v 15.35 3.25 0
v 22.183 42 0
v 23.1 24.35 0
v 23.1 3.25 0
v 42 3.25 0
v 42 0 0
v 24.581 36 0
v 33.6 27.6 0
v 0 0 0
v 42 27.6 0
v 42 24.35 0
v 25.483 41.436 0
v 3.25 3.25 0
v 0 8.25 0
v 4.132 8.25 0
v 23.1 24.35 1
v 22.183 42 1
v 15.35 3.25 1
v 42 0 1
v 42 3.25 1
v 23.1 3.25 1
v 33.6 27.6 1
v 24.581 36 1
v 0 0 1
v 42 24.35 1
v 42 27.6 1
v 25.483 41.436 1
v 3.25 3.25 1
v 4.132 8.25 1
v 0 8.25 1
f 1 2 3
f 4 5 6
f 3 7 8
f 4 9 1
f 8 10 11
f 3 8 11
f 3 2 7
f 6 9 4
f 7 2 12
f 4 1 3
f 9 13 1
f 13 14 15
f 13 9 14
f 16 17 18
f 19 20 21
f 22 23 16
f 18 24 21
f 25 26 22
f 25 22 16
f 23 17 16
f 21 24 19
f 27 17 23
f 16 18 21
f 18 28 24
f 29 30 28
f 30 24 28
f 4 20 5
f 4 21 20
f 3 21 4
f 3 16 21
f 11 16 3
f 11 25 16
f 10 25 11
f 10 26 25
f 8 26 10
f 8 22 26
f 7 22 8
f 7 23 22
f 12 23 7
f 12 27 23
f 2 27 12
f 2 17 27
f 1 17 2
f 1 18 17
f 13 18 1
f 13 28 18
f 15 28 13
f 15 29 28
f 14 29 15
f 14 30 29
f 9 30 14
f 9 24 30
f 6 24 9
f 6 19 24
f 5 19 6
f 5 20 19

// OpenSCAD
// created by IndiePandaaaaa | Lukas

THICKNESS = 3.25;
TOLERANCE = 0.1;
CHAMFER = 1.5;
SCREW_OD = 3.5;
$fn = 75;

DESK_THICKNESS = 21;
PHONE_THICKNESS = 12;
PHONE_ANGLE = 10;

module phone_mount(desk_thickness, phone_thickness, phone_angle = 10, thickness = 3, chamfer = 1, tolerance = 0.1) {
    linear_extrude(1) {
        depth = desk_thickness * 2;
        height = desk_thickness * 2;
        slope_angle = 30;
        polygon([
                [0, 0],
                [depth, 0],
                [depth, thickness],
                [depth * 0.55, thickness],
                [depth * 0.55, thickness + desk_thickness + tolerance],
                [depth, thickness + desk_thickness + tolerance],
                [depth, thickness * 2 + desk_thickness + tolerance],
                [depth * 0.8, thickness * 2 + desk_thickness + tolerance],
                [depth * 0.55 + (depth * 0.2) / tan(90 - phone_angle),
                                thickness * 2 + desk_thickness + tolerance + depth * 0.2],
                [(thickness + phone_thickness + tolerance) + (height - thickness) / tan(90 - phone_angle)
                + thickness / cos(phone_angle), height - thickness * sin(phone_angle)],
                [(thickness + phone_thickness + tolerance) + (height - thickness) / tan(90 - phone_angle), height],
                [(thickness + phone_thickness + tolerance), thickness],
                [thickness, thickness],
                [thickness + tan(phone_angle) * 5, thickness + 5],
                [0, thickness + 5],
            ]);
    }
}

phone_mount(DESK_THICKNESS, PHONE_THICKNESS, PHONE_ANGLE, THICKNESS, CHAMFER, TOLERANCE);
